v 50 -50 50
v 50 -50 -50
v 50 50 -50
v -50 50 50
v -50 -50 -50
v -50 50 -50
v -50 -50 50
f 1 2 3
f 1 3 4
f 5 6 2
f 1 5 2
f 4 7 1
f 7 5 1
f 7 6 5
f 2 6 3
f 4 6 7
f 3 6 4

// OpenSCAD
s = 50;
p = [for(x=[-s, s], y=[-s, s], z=[-s, s]) if(!(x==50&&y==50&&z==50))
[x,y,z]];

echo(p);
hull()  polyhedron(p, [[0,1,2,3,4,5,6]]);
